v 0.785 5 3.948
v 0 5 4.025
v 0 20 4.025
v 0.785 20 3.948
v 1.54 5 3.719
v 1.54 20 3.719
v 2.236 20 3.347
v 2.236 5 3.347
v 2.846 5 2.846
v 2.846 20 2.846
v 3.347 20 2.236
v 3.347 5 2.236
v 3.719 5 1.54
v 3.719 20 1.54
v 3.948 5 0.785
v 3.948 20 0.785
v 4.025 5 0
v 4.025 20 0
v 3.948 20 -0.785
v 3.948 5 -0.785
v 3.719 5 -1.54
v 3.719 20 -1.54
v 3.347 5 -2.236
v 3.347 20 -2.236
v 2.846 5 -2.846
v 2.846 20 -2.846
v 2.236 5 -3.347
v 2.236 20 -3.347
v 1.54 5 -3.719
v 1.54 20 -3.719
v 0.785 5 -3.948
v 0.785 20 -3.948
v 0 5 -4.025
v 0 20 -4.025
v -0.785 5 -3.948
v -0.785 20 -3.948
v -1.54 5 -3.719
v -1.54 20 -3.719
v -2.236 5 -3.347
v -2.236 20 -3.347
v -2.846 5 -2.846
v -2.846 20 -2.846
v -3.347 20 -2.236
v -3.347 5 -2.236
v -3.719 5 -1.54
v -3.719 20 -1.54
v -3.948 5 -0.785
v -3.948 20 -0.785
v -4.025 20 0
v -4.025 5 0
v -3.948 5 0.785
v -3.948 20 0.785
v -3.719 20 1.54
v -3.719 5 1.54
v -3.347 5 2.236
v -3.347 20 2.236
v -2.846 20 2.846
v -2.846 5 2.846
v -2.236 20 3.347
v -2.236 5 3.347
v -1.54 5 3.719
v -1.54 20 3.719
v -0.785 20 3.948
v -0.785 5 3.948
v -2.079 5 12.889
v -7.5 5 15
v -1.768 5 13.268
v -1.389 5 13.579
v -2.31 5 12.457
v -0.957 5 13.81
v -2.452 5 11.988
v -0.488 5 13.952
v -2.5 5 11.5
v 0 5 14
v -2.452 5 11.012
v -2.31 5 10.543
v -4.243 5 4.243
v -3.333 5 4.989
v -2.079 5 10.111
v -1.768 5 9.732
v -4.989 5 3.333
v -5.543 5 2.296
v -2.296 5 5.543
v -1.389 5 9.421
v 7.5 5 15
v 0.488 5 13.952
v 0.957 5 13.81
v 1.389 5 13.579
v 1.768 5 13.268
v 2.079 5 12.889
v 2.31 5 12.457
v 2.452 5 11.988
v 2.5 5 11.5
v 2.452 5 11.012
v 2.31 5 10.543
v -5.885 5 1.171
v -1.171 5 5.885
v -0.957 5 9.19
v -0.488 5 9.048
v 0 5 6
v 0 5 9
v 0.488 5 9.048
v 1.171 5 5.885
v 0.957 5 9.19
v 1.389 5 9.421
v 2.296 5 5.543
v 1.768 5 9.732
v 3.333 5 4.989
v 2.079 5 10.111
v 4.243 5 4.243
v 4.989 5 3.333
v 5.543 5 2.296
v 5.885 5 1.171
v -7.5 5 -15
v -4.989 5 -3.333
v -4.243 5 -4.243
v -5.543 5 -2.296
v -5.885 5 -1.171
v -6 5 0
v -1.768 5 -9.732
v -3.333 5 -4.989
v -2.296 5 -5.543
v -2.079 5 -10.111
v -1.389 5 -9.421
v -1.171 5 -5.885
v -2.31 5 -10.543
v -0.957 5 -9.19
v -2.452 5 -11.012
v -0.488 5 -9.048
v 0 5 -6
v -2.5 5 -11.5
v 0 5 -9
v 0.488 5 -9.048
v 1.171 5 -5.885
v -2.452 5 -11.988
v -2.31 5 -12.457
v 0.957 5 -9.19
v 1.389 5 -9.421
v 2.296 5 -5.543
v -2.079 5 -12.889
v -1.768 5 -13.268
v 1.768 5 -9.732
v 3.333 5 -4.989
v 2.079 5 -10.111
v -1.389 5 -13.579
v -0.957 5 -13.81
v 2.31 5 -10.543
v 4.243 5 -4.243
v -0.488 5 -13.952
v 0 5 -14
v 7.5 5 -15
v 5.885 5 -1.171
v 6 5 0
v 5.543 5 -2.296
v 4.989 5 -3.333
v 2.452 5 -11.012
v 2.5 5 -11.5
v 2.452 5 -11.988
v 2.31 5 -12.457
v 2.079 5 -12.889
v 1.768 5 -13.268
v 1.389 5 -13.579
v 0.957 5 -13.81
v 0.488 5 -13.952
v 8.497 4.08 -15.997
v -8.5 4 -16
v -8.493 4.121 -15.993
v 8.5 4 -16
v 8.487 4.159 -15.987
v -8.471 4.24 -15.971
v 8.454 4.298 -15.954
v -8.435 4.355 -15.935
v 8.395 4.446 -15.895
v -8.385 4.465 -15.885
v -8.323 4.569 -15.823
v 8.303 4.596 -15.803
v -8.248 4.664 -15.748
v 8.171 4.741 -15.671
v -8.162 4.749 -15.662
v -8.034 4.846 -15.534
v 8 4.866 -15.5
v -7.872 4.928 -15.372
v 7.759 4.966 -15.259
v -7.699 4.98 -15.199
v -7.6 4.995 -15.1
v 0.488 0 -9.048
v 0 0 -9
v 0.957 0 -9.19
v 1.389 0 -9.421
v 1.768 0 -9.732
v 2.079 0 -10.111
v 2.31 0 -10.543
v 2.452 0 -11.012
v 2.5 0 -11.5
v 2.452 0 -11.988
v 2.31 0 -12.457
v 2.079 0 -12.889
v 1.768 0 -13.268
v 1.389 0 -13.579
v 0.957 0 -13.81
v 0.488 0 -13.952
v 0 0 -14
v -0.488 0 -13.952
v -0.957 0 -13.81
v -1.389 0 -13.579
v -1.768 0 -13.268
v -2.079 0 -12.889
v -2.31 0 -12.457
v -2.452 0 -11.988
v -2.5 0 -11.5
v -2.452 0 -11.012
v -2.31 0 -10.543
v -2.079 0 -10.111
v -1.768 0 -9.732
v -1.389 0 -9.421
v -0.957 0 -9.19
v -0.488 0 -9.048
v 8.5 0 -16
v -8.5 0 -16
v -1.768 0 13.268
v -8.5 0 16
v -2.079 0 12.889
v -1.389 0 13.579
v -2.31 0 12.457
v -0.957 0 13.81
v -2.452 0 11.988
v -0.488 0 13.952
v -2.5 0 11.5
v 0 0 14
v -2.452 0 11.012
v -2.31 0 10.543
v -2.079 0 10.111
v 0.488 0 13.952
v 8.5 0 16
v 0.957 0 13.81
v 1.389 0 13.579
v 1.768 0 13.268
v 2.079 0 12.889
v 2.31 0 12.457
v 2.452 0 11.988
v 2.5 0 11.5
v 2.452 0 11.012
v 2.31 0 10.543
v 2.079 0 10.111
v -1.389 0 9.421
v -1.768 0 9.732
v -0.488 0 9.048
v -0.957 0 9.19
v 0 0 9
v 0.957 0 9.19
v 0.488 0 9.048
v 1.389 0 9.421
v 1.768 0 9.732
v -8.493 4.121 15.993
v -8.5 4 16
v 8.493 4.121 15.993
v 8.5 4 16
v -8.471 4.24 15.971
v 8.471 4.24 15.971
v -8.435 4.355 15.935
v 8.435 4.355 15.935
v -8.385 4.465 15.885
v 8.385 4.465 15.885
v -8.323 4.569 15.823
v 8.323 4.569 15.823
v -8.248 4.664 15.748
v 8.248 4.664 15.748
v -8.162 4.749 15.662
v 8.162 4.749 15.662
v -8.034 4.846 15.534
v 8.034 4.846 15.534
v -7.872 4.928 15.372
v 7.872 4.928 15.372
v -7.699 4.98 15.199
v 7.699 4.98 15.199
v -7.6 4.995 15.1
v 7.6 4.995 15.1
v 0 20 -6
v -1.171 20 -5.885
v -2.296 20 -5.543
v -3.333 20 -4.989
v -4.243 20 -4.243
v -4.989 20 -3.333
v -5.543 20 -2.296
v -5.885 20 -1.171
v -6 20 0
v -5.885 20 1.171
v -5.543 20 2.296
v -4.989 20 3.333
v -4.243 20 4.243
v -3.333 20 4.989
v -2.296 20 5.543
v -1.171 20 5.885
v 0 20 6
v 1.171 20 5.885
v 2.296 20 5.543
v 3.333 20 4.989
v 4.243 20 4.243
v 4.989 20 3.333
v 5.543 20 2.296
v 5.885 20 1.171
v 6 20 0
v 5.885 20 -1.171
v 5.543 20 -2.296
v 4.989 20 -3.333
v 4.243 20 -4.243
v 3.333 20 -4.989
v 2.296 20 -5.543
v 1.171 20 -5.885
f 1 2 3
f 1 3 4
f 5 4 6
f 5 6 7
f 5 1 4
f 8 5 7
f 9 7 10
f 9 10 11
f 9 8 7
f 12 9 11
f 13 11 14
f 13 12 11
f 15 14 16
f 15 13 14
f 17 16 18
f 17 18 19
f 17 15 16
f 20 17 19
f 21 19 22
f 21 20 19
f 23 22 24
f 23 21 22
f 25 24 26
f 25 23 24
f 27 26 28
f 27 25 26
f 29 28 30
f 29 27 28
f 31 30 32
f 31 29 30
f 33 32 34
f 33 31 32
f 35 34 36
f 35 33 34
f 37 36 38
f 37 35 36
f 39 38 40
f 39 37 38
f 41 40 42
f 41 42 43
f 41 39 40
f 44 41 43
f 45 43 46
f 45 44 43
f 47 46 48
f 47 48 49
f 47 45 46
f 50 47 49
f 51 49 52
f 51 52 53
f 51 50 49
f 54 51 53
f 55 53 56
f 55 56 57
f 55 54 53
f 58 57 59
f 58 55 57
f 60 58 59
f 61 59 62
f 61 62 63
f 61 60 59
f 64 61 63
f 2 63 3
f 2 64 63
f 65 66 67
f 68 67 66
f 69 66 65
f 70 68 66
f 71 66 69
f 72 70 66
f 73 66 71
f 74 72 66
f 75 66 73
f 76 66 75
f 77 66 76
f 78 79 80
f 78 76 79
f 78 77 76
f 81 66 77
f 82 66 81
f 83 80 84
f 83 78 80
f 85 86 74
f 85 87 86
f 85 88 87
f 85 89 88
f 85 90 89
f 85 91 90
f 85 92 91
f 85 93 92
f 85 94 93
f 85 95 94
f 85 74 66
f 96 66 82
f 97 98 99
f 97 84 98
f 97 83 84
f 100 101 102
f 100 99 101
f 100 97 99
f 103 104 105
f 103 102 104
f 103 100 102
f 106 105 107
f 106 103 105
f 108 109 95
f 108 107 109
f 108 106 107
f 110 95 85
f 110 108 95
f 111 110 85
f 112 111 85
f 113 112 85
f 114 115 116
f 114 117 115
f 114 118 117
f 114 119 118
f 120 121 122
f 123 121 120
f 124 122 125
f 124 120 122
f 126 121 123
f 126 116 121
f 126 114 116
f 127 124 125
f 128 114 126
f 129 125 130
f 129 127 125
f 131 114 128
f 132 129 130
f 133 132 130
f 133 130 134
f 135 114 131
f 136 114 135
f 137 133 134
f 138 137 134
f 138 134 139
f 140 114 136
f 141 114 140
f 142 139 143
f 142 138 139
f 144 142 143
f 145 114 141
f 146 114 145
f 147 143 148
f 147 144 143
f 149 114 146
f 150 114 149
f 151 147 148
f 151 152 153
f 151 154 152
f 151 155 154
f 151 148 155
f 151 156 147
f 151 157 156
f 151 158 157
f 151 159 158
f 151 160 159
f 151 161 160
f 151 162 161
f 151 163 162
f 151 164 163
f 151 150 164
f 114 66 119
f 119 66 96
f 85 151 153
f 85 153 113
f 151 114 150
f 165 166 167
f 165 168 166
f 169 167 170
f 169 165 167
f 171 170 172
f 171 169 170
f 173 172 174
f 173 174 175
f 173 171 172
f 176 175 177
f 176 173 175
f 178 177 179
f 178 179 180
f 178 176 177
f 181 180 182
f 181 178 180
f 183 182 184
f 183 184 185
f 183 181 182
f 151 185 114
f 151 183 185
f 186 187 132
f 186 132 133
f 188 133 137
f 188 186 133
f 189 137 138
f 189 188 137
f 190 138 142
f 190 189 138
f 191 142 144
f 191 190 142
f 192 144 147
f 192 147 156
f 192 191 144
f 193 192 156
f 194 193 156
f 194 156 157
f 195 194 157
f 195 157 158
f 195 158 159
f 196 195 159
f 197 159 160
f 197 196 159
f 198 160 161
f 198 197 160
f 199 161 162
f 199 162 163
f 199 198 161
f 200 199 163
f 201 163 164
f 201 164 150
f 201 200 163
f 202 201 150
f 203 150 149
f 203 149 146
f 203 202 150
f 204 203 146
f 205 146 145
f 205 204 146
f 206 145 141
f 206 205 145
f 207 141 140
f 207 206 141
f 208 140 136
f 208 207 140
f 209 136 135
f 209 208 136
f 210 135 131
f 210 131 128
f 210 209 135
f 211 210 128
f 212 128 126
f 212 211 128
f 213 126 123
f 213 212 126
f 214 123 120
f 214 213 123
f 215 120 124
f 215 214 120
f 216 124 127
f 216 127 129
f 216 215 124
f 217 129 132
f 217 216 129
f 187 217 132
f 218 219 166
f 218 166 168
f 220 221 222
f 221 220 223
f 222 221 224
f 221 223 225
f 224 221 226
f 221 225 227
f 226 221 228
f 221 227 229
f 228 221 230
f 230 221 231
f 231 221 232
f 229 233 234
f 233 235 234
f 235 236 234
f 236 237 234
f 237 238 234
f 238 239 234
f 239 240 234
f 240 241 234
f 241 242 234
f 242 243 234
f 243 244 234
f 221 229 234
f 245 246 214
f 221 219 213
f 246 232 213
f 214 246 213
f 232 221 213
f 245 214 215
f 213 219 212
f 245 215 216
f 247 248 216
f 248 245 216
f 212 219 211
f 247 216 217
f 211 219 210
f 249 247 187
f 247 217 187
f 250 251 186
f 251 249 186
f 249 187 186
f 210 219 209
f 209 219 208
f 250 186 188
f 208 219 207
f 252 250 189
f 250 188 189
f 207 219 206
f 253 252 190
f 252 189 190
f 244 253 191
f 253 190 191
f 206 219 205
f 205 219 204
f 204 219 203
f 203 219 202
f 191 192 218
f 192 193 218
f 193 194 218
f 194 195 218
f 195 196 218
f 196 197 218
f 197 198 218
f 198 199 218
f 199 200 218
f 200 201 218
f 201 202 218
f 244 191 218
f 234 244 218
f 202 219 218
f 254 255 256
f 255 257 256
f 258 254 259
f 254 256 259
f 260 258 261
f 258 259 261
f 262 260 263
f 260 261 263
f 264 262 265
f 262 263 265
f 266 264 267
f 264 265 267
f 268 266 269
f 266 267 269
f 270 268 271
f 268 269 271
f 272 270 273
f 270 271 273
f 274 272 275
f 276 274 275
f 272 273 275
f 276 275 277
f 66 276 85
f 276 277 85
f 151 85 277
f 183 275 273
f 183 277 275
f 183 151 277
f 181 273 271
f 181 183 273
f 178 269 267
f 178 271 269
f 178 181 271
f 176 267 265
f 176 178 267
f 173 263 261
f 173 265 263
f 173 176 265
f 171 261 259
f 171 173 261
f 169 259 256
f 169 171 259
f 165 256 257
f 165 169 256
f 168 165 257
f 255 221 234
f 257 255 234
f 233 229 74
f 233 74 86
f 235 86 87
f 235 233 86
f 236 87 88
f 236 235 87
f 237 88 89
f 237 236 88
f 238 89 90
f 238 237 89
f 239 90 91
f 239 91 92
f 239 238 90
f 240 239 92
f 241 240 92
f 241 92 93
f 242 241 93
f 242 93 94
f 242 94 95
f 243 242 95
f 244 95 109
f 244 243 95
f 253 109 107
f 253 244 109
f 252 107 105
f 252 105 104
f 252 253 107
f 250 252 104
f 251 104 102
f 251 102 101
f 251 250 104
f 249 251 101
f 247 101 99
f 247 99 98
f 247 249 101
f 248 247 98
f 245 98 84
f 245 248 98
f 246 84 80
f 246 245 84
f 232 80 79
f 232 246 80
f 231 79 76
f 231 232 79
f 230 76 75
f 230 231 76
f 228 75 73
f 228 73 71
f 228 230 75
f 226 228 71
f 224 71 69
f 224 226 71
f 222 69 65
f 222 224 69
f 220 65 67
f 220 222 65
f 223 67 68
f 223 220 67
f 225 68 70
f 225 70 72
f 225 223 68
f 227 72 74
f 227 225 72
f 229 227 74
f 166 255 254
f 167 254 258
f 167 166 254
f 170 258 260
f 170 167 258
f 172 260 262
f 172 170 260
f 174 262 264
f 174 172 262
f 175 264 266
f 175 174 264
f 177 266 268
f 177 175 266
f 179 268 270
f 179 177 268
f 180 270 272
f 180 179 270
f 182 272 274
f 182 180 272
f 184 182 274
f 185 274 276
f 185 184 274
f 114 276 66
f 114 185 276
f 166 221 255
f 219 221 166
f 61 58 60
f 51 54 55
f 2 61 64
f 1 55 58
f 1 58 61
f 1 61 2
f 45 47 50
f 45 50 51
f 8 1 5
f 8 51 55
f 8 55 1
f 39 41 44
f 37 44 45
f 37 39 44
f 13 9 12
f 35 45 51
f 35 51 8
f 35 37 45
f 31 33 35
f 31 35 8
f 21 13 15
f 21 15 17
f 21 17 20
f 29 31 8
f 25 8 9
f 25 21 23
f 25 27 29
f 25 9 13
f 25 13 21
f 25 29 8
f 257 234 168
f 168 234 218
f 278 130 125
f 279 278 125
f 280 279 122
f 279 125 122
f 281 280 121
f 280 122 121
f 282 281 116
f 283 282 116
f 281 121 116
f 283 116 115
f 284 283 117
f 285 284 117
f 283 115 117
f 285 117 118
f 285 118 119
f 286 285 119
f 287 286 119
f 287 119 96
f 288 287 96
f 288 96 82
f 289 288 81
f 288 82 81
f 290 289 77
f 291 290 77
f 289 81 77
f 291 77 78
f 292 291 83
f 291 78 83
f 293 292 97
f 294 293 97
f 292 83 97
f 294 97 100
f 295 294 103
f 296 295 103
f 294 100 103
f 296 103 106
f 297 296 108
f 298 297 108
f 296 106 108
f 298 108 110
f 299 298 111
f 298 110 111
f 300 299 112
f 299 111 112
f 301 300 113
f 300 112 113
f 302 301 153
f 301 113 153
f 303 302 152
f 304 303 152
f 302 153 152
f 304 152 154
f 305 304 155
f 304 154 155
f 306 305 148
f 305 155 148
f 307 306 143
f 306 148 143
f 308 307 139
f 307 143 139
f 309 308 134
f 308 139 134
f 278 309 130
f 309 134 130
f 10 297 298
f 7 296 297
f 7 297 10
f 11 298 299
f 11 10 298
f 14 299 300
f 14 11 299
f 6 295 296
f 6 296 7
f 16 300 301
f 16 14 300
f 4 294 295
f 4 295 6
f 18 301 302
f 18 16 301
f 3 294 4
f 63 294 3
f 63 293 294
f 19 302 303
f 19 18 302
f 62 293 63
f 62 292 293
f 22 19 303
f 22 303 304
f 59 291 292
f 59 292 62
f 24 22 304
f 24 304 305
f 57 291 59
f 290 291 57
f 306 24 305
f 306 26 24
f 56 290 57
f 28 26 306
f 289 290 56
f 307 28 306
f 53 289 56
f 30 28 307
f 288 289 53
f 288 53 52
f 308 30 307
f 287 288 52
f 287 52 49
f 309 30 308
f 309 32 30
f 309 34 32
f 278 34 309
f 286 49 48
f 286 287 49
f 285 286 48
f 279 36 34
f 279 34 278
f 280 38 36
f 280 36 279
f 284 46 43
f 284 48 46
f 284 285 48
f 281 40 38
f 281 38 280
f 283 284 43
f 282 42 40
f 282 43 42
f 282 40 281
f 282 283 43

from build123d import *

# Parameters (mm, degrees)
SKETCH1_W           = 17
SKETCH1_H           = 32
SKETCH1_R           = 2.5
BOSS_EXTRUDE1_DEPTH = 5
SKETCH2_R           = 6
SKETCH2_R_2         = 4.025
BOSS_EXTRUDE2_DEPTH = 15
FILLET1_R           = 1


with BuildPart() as part:
    # Sketch1 → Boss-Extrude1 (new body)
    with BuildSketch(Plane(origin=(0, 0, 0), x_dir=(1, 0, 0), z_dir=(0, 1, 0))):
        Rectangle(SKETCH1_W, SKETCH1_H)
        with Locations(Location((0, 11.5, 0), (0, 0, 270))):
            Circle(SKETCH1_R, mode=Mode.SUBTRACT)
        with Locations(Location((0, -11.5, 0), (0, 0, 270))):
            Circle(SKETCH1_R, mode=Mode.SUBTRACT)
    extrude(amount=BOSS_EXTRUDE1_DEPTH)

    # Sketch2 → Boss-Extrude2 (add)
    with BuildSketch(Plane(origin=(0, 5, 0), x_dir=(1, 0, 0), z_dir=(0, 1, 0))):
        with Locations(Location((0, 0, 0), (0, 0, 90))):
            Circle(SKETCH2_R)
        with Locations(Location((0, 0, 0), (0, 0, 270))):
            Circle(SKETCH2_R_2, mode=Mode.SUBTRACT)
    extrude(amount=BOSS_EXTRUDE2_DEPTH)

    # Fillet1
    fillet1_edges = [part.edges().sort_by_distance(p)[0] for p in [
        (-8.5, 5, 0),
        (0, 5, 16),
        (8.5, 5, 0),
        (0, 5, -16),
    ]]
    fillet(fillet1_edges, radius=FILLET1_R)


solid = part.part
